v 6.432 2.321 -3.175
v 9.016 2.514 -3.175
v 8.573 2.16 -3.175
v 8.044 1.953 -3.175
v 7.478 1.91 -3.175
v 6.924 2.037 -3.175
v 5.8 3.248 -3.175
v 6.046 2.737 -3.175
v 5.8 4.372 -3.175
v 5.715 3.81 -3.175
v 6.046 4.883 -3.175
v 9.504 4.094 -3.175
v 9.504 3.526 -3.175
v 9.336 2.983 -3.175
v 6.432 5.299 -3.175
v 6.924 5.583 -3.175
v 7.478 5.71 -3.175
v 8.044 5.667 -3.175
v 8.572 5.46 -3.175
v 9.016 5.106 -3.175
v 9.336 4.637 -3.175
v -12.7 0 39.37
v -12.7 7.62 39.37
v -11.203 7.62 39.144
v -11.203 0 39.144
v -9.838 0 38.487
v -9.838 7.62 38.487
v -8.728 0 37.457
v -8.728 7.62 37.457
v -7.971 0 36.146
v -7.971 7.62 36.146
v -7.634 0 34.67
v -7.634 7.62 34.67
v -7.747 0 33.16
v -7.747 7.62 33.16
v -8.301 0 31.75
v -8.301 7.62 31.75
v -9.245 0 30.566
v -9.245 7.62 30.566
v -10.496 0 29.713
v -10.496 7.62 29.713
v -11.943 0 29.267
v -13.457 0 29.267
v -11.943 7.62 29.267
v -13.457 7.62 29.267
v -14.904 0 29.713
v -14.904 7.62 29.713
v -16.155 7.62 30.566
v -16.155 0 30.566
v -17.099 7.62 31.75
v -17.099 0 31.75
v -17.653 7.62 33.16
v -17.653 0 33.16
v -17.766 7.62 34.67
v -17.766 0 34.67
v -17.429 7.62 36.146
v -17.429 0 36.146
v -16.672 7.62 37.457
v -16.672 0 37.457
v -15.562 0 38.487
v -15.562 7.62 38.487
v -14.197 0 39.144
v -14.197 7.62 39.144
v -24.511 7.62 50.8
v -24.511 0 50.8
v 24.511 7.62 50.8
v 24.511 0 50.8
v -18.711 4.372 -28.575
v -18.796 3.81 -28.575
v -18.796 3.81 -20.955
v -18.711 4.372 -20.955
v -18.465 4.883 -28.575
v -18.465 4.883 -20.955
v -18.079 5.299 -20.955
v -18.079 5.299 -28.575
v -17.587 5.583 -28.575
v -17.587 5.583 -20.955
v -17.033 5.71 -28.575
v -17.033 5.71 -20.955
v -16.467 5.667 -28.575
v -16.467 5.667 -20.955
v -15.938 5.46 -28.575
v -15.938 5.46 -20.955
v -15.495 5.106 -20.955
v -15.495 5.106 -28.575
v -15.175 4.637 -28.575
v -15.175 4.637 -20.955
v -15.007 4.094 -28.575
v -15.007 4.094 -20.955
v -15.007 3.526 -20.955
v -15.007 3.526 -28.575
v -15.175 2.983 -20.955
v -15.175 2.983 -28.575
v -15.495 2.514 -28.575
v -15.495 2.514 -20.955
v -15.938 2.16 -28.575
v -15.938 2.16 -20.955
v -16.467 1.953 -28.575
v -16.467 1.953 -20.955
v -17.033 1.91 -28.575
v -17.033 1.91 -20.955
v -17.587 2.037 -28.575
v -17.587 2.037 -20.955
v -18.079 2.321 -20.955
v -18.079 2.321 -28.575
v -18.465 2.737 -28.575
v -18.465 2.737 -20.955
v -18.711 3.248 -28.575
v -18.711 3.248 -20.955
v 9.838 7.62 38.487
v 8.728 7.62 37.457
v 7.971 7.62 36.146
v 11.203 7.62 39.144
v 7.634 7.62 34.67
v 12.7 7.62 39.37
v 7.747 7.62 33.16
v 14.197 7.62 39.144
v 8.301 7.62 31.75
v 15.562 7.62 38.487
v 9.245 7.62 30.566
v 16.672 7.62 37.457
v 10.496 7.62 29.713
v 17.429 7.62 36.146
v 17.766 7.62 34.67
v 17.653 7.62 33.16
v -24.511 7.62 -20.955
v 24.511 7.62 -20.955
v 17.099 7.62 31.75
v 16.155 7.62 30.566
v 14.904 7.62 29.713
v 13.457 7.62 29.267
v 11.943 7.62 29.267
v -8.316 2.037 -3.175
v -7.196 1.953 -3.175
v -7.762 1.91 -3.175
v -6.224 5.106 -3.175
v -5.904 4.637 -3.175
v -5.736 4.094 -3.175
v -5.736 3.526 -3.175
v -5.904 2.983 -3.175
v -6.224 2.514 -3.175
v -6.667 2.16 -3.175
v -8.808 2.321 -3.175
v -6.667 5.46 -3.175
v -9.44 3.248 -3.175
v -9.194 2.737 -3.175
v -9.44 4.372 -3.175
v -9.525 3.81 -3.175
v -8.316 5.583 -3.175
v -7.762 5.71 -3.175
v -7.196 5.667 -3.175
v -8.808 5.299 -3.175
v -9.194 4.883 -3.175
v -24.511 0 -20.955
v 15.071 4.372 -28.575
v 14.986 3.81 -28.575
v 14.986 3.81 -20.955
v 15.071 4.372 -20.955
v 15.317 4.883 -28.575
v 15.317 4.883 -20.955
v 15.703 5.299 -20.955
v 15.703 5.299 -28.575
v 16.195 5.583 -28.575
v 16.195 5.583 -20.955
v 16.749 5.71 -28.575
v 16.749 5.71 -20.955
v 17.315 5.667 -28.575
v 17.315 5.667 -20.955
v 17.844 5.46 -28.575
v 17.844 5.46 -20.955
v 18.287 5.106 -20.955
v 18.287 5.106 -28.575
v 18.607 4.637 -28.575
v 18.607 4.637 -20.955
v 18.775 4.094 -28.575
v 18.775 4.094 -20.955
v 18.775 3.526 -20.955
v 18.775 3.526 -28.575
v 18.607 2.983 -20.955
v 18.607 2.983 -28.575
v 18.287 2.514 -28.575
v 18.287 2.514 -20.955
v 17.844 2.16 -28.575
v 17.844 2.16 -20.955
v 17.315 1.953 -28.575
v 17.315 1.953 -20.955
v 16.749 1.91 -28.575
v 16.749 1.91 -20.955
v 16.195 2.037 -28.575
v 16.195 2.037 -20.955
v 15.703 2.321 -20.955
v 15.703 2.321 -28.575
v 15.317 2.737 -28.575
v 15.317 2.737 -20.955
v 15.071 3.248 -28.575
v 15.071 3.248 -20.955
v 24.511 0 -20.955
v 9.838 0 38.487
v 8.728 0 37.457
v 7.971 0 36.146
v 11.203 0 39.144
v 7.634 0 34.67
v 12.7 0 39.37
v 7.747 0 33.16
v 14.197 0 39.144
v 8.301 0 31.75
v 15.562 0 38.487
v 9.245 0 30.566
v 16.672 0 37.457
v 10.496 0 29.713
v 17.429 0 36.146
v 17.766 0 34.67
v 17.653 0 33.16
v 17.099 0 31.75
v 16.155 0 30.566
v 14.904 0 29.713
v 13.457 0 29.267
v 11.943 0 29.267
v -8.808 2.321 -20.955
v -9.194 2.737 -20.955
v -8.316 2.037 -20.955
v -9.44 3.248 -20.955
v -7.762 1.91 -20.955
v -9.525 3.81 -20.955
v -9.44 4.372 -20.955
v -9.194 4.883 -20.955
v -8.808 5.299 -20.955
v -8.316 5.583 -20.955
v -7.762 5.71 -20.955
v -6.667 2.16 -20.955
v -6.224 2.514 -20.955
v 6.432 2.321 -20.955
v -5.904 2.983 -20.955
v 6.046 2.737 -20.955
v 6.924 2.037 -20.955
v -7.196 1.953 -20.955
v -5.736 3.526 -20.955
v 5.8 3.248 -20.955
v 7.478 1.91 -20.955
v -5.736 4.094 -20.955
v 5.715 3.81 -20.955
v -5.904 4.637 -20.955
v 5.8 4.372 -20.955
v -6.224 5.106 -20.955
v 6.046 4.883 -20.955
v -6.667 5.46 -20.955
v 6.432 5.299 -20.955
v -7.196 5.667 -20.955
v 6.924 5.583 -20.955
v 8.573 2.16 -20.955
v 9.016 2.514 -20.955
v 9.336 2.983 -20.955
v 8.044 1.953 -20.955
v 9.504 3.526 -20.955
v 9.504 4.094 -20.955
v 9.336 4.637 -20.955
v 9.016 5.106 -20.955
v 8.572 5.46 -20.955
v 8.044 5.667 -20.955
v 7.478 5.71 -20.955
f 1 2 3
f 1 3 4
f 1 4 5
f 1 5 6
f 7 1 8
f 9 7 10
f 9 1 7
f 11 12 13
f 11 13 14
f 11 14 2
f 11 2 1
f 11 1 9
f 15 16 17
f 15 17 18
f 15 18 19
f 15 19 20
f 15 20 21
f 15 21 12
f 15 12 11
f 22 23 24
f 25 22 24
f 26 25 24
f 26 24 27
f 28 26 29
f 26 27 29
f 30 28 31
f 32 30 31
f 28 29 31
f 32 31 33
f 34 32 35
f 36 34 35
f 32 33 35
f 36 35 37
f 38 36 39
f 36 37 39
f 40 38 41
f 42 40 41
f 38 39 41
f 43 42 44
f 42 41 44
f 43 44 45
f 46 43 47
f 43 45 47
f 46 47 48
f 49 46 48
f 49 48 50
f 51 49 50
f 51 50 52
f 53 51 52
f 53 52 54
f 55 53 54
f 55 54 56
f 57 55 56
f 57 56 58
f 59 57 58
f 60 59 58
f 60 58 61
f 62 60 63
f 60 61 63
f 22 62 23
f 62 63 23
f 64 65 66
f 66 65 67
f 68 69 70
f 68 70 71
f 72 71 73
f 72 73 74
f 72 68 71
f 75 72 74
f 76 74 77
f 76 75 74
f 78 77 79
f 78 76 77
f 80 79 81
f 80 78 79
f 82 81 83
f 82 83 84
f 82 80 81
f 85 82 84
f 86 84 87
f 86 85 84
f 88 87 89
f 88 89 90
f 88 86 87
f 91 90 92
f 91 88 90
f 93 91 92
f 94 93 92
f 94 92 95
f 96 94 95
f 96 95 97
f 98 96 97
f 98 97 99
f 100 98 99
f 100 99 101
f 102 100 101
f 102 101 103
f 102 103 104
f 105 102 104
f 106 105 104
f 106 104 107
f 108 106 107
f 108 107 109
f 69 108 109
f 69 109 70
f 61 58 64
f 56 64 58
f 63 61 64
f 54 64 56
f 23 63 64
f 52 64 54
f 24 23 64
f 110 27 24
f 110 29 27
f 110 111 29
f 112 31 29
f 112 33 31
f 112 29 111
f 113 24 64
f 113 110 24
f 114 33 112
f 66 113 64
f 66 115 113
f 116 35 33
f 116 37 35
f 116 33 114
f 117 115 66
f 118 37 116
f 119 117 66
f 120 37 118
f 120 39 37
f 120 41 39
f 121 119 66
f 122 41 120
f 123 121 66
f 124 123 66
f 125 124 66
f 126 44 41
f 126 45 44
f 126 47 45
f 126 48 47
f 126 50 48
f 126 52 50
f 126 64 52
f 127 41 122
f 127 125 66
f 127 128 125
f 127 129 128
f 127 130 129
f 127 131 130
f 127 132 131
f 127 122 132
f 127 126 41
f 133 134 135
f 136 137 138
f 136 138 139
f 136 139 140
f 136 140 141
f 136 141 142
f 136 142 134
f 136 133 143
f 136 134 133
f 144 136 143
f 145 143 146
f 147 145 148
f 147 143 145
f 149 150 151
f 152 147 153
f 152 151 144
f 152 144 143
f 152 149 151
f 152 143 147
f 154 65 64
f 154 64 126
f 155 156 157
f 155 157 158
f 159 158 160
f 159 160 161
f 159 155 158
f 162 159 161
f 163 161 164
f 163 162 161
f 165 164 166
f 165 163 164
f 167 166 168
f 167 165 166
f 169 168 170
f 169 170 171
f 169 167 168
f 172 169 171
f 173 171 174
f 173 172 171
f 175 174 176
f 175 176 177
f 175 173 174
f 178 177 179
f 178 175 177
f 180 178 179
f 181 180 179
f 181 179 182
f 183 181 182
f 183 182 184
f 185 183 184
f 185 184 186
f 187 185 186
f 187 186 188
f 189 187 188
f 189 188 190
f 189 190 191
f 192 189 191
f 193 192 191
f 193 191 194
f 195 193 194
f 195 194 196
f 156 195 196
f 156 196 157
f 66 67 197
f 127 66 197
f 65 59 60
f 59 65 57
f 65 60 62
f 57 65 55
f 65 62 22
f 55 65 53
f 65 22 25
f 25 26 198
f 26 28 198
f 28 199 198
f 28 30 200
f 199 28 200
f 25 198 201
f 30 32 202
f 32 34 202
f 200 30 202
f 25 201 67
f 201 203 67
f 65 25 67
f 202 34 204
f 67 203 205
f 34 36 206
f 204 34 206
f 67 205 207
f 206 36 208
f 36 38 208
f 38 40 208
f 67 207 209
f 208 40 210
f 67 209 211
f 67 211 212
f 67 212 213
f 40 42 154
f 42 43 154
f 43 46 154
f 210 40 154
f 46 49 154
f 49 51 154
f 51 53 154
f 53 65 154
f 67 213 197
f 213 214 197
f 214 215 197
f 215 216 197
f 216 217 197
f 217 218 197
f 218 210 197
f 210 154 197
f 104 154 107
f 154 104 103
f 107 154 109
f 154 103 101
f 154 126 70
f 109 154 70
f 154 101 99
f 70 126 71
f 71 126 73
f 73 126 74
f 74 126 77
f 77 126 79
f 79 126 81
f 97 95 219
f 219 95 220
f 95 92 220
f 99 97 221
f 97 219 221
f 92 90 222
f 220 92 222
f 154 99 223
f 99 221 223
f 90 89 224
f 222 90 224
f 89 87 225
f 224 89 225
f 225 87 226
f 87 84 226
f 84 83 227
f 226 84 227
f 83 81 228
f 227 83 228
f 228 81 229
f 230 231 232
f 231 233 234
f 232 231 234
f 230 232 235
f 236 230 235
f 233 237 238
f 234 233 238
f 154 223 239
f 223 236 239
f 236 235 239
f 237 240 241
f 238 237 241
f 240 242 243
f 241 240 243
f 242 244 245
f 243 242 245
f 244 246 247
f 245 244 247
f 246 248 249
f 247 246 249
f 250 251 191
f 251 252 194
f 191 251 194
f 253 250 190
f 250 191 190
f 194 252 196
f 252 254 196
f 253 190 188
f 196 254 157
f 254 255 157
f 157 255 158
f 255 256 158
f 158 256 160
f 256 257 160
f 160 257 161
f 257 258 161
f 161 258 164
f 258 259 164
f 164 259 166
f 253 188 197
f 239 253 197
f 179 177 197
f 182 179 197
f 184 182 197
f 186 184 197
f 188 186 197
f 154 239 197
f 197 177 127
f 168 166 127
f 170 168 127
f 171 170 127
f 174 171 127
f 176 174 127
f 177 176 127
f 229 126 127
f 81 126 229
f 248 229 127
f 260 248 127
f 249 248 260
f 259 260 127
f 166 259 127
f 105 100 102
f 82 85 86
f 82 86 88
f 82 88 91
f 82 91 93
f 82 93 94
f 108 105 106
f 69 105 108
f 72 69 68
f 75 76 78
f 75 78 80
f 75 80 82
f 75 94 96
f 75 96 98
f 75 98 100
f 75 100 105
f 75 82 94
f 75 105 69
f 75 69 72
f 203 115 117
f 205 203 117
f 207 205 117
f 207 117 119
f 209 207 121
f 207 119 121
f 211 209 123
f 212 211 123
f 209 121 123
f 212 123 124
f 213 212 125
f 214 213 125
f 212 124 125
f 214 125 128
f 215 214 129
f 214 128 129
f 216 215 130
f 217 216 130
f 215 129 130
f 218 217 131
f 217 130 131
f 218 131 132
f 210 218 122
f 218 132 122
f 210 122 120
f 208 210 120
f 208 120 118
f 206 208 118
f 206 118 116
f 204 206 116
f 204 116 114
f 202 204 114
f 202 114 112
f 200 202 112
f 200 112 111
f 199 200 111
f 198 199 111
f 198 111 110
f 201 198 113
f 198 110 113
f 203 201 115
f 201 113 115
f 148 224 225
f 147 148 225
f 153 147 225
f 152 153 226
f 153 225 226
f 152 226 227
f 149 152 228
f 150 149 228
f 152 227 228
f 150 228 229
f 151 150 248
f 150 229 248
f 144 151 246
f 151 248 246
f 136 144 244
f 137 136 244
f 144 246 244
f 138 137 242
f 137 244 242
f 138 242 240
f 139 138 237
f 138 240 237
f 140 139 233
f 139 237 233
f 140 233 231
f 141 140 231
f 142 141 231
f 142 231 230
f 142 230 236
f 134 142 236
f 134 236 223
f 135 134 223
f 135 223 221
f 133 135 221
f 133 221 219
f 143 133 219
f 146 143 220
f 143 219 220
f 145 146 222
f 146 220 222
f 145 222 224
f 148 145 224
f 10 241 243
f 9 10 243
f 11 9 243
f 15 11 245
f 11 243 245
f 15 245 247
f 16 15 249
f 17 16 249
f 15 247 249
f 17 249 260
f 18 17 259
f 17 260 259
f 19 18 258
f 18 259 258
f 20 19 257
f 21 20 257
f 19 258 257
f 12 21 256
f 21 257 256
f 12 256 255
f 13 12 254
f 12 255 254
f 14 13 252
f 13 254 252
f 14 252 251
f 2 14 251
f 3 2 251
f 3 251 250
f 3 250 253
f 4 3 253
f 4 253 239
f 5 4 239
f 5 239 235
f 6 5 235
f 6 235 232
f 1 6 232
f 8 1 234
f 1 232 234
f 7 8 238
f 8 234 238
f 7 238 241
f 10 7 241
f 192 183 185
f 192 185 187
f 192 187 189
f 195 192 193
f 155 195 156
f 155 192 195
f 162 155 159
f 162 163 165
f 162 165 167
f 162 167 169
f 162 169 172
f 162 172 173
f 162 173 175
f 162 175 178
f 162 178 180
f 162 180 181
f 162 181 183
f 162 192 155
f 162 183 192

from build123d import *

# Parameters (mm, degrees)
SKETCH1_W           = 49.022
SKETCH1_H           = 101.6
BOSS_EXTRUDE1_DEPTH = 7.62
SKETCH2_R           = 5.08
CUT_EXTRUDE1_DEPTH  = 7.62
SKETCH4_W           = 49.022
SKETCH4_H           = 29.845
CUT_EXTRUDE2_DEPTH  = 57.916548745
SKETCH5_R           = 1.905
CUT_EXTRUDE3_DEPTH  = 17.78
BOSS_EXTRUDE3_START = 25.4
SKETCH6_R           = 1.905
BOSS_EXTRUDE3_DEPTH = 25.4


with BuildPart() as part:
    # Sketch1 → Boss-Extrude1 (new body)
    with BuildSketch(Plane(origin=(0, 0, 0), x_dir=(1, 0, 0), z_dir=(0, 1, 0))):
        Rectangle(SKETCH1_W, SKETCH1_H)
    extrude(amount=BOSS_EXTRUDE1_DEPTH)

    # Sketch2 → Cut-Extrude1 (cut)
    with BuildSketch(Plane(origin=(0, 7.62, 0), x_dir=(1, 0, 0), z_dir=(0, 1, 0))):
        with Locations(Location((12.7, -34.29, 0), (0, 0, 270))):
            Circle(SKETCH2_R)
        with Locations(Location((-12.7, -34.29, 0), (0, 0, 270))):
            Circle(SKETCH2_R)
    extrude(amount=-CUT_EXTRUDE1_DEPTH, mode=Mode.SUBTRACT)

    # Sketch4 → Cut-Extrude2 (cut, through all)
    with BuildSketch(Plane(origin=(0, 7.62, 0), x_dir=(1, 0, 0), z_dir=(0, 1, 0))):
        with Locations((0, 35.8775)):
            Rectangle(SKETCH4_W, SKETCH4_H)
    extrude(amount=-CUT_EXTRUDE2_DEPTH, mode=Mode.SUBTRACT)

    # Sketch5 → Cut-Extrude3 (cut)
    with BuildSketch(Plane(origin=(0, 0, -20.955), x_dir=(-1, 0, 0), z_dir=(0, 0, -1))):
        with Locations((-16.891, 3.81)):
            Circle(SKETCH5_R)
        with Locations((-7.62, 3.81)):
            Circle(SKETCH5_R)
        with Locations((7.62, 3.81)):
            Circle(SKETCH5_R)
        with Locations((16.891, 3.81)):
            Circle(SKETCH5_R)
    extrude(amount=-CUT_EXTRUDE3_DEPTH, mode=Mode.SUBTRACT)

    # Sketch6 → Boss-Extrude3 (add)
    with BuildSketch(Plane(origin=(0, 0, -3.175), x_dir=(-1, 0, 0), z_dir=(0, 0, -1)).offset(BOSS_EXTRUDE3_START)):
        with Locations((-16.891, 3.81)):
            Circle(SKETCH6_R)
        with Locations((16.891, 3.81)):
            Circle(SKETCH6_R)
    extrude(amount=-BOSS_EXTRUDE3_DEPTH)


solid = part.part
